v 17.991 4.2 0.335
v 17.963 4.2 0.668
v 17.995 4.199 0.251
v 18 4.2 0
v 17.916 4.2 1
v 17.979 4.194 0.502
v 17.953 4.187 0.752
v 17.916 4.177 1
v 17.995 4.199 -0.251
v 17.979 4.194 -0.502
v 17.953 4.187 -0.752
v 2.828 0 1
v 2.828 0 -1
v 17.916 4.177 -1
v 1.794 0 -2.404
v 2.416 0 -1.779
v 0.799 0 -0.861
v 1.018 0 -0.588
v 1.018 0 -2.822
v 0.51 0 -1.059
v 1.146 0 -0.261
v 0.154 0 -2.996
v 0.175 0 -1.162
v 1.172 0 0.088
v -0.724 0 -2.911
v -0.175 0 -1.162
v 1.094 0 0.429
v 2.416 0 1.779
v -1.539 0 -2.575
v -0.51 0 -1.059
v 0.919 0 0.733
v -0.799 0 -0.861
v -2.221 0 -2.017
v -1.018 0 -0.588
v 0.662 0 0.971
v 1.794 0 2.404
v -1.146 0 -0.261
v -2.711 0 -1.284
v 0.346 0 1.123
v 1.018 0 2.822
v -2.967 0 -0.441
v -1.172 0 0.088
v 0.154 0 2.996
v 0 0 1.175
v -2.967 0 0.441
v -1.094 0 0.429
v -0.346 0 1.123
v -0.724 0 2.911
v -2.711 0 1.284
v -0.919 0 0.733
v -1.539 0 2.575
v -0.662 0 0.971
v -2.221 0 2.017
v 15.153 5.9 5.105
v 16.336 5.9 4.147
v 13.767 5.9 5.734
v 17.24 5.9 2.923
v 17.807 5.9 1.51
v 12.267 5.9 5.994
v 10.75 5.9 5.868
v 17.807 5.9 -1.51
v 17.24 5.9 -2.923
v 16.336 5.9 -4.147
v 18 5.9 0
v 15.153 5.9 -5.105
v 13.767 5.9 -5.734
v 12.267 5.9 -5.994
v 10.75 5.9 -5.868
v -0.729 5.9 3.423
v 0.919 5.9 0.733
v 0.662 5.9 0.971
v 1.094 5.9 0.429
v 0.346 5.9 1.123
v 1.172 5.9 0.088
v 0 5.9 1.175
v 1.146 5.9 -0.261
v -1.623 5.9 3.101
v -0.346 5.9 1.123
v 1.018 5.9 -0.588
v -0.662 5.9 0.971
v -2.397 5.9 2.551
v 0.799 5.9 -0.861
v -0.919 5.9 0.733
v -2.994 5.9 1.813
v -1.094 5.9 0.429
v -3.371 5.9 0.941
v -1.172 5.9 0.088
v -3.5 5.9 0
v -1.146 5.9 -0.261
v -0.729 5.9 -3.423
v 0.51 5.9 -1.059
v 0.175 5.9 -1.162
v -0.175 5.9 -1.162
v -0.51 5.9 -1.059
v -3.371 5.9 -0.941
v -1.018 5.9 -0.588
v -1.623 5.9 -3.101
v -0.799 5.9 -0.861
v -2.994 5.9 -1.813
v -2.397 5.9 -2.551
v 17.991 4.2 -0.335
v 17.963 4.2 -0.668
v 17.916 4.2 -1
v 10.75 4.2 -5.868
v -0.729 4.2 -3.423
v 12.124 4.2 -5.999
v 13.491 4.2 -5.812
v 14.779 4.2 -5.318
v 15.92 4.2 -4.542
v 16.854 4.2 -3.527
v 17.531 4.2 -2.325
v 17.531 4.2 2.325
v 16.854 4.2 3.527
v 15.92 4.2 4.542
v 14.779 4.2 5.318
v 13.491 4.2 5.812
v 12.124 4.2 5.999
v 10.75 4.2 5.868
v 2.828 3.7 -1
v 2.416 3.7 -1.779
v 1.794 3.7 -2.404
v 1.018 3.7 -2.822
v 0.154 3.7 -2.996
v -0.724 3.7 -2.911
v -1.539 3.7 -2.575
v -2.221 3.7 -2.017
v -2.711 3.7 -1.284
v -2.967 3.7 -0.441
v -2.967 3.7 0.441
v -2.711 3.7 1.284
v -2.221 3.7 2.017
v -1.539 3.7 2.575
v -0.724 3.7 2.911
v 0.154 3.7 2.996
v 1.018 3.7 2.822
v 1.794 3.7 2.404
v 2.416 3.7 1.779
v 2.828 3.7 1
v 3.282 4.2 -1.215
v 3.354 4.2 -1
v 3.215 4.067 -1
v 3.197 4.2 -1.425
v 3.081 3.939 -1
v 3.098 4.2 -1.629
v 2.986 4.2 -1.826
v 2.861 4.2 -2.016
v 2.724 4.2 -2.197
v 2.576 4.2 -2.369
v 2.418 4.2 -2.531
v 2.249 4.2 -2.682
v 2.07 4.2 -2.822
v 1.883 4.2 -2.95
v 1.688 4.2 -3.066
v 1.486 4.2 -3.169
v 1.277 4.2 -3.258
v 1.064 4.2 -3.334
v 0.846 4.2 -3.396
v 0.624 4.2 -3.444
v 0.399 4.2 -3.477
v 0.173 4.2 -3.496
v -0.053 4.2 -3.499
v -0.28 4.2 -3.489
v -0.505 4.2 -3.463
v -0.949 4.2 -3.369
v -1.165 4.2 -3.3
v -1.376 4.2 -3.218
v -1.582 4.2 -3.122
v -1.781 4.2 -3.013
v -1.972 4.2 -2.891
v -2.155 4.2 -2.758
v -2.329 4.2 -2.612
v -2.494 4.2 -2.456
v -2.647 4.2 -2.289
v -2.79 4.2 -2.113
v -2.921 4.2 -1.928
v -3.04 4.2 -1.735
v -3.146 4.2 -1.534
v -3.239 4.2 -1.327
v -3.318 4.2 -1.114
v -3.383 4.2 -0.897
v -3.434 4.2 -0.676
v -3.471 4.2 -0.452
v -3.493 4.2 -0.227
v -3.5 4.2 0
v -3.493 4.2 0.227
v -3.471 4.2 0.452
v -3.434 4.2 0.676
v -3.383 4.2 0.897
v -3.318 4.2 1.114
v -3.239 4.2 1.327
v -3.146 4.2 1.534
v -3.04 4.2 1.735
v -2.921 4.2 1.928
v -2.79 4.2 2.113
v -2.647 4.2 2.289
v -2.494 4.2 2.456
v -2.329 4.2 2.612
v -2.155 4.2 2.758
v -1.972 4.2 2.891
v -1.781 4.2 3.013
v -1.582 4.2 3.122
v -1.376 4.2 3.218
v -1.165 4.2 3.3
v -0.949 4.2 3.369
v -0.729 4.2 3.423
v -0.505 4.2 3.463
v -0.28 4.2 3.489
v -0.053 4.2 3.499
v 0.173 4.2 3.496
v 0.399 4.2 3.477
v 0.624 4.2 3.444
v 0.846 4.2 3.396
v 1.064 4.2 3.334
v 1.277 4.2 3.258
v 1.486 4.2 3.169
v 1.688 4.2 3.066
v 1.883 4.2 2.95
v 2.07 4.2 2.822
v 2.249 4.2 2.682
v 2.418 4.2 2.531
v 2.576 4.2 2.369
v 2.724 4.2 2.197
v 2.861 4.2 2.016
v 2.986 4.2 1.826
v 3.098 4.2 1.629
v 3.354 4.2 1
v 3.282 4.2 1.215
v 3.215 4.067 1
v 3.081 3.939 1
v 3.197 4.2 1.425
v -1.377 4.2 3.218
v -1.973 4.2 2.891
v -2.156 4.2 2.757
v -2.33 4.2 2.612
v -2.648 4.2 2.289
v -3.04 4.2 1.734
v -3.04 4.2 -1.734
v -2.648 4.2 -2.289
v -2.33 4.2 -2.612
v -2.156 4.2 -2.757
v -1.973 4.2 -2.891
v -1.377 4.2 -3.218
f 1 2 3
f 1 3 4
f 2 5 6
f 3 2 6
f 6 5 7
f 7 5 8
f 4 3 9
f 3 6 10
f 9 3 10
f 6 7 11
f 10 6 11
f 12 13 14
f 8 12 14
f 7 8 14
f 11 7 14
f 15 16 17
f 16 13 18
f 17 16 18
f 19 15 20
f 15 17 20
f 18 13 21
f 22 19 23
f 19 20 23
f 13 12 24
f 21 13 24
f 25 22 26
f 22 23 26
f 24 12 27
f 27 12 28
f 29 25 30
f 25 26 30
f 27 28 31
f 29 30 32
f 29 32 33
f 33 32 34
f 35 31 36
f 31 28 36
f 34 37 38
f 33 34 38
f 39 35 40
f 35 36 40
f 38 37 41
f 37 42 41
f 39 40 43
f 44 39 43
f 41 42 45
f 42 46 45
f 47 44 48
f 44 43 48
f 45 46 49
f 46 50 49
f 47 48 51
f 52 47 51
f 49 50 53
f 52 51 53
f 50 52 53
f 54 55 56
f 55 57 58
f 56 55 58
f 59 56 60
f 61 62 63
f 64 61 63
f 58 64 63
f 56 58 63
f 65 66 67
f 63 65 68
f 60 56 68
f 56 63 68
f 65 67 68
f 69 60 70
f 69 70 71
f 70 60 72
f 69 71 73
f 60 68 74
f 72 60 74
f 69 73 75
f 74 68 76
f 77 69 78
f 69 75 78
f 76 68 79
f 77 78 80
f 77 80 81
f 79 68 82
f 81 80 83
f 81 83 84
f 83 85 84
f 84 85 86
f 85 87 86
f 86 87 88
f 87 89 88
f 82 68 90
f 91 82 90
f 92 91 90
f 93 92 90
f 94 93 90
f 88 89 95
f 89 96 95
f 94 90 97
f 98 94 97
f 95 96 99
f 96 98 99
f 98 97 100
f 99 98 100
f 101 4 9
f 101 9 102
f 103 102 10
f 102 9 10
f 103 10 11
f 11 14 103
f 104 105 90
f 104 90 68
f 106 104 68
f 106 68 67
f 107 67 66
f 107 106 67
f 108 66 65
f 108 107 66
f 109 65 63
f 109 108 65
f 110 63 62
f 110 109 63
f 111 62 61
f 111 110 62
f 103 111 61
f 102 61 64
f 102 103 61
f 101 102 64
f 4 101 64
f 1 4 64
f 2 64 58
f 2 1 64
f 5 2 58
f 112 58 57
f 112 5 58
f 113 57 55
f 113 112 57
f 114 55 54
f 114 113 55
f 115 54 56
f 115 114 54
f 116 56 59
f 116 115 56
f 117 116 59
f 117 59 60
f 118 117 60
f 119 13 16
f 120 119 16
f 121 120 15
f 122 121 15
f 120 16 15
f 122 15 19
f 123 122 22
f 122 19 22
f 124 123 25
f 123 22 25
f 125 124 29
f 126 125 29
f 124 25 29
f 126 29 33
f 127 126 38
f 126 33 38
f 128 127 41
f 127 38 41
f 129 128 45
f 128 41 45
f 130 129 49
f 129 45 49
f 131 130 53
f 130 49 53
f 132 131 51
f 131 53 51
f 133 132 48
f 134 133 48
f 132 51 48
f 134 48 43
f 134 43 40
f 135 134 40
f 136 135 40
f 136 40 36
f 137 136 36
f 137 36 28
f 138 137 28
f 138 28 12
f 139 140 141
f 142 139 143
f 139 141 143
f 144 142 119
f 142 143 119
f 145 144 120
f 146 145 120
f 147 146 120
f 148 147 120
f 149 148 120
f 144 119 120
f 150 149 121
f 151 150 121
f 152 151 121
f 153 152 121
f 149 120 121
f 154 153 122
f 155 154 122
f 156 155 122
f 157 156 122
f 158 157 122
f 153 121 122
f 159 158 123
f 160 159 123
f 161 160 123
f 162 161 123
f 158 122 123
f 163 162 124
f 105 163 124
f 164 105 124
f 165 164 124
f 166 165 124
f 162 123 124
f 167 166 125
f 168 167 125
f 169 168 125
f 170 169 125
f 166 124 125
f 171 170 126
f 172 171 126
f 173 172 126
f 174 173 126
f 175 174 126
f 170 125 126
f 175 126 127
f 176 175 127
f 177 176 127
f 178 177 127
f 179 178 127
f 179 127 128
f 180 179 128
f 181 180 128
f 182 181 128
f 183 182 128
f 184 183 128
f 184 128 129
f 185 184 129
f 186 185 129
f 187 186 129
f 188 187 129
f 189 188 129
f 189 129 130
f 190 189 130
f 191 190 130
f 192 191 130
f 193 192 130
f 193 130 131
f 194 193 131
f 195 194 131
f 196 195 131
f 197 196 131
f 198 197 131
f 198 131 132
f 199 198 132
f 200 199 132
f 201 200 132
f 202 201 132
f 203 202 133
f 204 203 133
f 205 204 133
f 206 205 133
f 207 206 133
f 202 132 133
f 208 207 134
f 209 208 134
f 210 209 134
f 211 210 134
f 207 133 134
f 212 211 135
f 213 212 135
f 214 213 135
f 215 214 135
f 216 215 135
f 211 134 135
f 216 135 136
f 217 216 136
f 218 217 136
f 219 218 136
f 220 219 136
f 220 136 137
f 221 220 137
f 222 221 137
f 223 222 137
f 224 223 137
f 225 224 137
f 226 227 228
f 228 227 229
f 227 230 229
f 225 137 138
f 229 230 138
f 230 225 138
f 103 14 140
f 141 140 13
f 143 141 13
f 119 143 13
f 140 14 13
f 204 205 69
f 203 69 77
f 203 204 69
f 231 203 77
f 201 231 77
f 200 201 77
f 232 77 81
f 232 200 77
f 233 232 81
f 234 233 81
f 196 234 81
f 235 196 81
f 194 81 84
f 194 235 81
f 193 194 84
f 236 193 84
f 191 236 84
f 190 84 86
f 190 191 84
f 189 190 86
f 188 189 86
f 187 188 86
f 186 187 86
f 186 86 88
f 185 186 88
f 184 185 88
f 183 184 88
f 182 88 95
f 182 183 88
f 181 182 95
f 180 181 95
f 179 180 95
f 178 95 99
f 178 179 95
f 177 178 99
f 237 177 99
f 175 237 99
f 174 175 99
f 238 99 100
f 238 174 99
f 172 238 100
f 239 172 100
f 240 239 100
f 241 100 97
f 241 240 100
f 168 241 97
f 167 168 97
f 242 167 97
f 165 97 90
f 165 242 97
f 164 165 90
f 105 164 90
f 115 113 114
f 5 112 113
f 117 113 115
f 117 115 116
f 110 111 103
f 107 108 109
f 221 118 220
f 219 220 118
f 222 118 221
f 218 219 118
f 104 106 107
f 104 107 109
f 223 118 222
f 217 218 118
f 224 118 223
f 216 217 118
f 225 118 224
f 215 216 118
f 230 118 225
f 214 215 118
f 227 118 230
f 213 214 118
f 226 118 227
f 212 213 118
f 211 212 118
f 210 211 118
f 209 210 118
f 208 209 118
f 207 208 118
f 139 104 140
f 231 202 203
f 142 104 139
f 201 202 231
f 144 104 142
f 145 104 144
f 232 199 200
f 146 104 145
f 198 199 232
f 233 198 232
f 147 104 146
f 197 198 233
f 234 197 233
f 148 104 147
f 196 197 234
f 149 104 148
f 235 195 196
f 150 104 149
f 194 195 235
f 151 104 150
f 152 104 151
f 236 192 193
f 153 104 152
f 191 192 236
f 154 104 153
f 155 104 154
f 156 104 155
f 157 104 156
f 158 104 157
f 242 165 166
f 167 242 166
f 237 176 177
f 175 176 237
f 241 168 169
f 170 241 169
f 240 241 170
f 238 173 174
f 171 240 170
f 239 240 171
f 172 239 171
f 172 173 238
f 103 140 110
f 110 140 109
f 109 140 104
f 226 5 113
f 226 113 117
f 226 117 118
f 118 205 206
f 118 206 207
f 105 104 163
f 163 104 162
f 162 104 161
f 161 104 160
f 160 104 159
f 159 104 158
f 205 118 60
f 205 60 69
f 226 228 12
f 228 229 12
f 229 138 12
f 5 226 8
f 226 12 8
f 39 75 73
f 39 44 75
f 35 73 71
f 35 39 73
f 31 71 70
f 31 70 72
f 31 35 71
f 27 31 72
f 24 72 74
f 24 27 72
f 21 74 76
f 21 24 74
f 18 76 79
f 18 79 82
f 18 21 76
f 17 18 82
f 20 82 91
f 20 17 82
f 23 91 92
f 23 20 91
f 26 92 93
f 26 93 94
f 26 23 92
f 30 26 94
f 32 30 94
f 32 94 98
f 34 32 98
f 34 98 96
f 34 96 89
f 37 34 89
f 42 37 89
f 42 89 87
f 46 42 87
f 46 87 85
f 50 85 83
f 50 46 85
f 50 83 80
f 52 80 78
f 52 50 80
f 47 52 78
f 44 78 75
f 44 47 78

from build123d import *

# Parameters (mm, degrees)
SKETCH1_R               = 3
SKETCH1_R_2             = 1.175
BOSS_EXTRUDE1_DEPTH     = 5.9
BOSS_EXTRUDE2_START     = -1.7
SKETCH3_R               = 1.175
BOSS_EXTRUDE2_DEPTH     = 1.7
BOSS_EXTRUDE3_START     = 4.2
BOSS_EXTRUDE3_DEPTH     = 4.2
CUT_EXTRUDE1_DEPTH      = 20.869826371
CUT_EXTRUDE1_DEPTH_BACK = 20.869826371
CHAMFER2_SIZE           = 0.5


with BuildPart() as part:
    # Sketch1 → Boss-Extrude1 (new body)
    with BuildSketch(Plane(origin=(0, 0, 0), x_dir=(1, 0, 0), z_dir=(0, 1, 0))):
        with Locations(Location((0, 0, 0), (0, 0, 270))):
            Circle(SKETCH1_R)
        with Locations(Location((0, 0, 0), (0, 0, 270))):
            Circle(SKETCH1_R_2, mode=Mode.SUBTRACT)
    extrude(amount=BOSS_EXTRUDE1_DEPTH)

    # Sketch3 → Boss-Extrude2 (add)
    with BuildSketch(Plane(origin=(0, 5.9, 0), x_dir=(1, 0, 0), z_dir=(0, 1, 0)).offset(BOSS_EXTRUDE2_START)):
        with BuildLine():
            Line((-0.729166667, 3.42320259), (10.75, 5.868347297))
            ThreePointArc((10.75, 5.868347297), (18, 0), (10.75, -5.868347297))
            Line((10.75, -5.868347297), (-0.729166667, -3.42320259))
            ThreePointArc((-0.729166667, -3.42320259), (-3.5, 0), (-0.729166667, 3.42320259))
        make_face()
        with Locations(Location((0, 0, 0), (0, 0, 270))):
            Circle(SKETCH3_R, mode=Mode.SUBTRACT)
    extrude(amount=BOSS_EXTRUDE2_DEPTH)

    # Sketch4 → Boss-Extrude3 (add)
    with BuildSketch(Plane.XZ.offset(-4.2).offset(BOSS_EXTRUDE3_START)):
        with BuildLine():
            Line((2.828427125, 1), (17.916079783, 1))
            ThreePointArc((17.916079783, 1), (18, 0), (17.916079783, -1))
            Line((17.916079783, -1), (2.828427125, -1))
            ThreePointArc((2.828427125, -1), (3, 0), (2.828427125, 1))
        make_face()
    extrude(amount=-BOSS_EXTRUDE3_DEPTH)

    # Sketch5 → Cut-Extrude1 (cut, two sides: drawn at the far end of the back side and taken through both)
    with BuildSketch(Plane.XY.offset(-CUT_EXTRUDE1_DEPTH_BACK)):
        Polygon((2.828427125, 0), (18, 4.2), (18, 0), align=None)
    extrude(amount=CUT_EXTRUDE1_DEPTH + CUT_EXTRUDE1_DEPTH_BACK, mode=Mode.SUBTRACT)

    # Chamfer2
    chamfer2_edges = [part.edges().sort_by_distance(p)[0] for p in [
        (-3, 4.2, 0),
    ]]
    chamfer(chamfer2_edges, length=CHAMFER2_SIZE - 0.0001)  # a hair under: the kernel refuses the full size


solid = part.part
